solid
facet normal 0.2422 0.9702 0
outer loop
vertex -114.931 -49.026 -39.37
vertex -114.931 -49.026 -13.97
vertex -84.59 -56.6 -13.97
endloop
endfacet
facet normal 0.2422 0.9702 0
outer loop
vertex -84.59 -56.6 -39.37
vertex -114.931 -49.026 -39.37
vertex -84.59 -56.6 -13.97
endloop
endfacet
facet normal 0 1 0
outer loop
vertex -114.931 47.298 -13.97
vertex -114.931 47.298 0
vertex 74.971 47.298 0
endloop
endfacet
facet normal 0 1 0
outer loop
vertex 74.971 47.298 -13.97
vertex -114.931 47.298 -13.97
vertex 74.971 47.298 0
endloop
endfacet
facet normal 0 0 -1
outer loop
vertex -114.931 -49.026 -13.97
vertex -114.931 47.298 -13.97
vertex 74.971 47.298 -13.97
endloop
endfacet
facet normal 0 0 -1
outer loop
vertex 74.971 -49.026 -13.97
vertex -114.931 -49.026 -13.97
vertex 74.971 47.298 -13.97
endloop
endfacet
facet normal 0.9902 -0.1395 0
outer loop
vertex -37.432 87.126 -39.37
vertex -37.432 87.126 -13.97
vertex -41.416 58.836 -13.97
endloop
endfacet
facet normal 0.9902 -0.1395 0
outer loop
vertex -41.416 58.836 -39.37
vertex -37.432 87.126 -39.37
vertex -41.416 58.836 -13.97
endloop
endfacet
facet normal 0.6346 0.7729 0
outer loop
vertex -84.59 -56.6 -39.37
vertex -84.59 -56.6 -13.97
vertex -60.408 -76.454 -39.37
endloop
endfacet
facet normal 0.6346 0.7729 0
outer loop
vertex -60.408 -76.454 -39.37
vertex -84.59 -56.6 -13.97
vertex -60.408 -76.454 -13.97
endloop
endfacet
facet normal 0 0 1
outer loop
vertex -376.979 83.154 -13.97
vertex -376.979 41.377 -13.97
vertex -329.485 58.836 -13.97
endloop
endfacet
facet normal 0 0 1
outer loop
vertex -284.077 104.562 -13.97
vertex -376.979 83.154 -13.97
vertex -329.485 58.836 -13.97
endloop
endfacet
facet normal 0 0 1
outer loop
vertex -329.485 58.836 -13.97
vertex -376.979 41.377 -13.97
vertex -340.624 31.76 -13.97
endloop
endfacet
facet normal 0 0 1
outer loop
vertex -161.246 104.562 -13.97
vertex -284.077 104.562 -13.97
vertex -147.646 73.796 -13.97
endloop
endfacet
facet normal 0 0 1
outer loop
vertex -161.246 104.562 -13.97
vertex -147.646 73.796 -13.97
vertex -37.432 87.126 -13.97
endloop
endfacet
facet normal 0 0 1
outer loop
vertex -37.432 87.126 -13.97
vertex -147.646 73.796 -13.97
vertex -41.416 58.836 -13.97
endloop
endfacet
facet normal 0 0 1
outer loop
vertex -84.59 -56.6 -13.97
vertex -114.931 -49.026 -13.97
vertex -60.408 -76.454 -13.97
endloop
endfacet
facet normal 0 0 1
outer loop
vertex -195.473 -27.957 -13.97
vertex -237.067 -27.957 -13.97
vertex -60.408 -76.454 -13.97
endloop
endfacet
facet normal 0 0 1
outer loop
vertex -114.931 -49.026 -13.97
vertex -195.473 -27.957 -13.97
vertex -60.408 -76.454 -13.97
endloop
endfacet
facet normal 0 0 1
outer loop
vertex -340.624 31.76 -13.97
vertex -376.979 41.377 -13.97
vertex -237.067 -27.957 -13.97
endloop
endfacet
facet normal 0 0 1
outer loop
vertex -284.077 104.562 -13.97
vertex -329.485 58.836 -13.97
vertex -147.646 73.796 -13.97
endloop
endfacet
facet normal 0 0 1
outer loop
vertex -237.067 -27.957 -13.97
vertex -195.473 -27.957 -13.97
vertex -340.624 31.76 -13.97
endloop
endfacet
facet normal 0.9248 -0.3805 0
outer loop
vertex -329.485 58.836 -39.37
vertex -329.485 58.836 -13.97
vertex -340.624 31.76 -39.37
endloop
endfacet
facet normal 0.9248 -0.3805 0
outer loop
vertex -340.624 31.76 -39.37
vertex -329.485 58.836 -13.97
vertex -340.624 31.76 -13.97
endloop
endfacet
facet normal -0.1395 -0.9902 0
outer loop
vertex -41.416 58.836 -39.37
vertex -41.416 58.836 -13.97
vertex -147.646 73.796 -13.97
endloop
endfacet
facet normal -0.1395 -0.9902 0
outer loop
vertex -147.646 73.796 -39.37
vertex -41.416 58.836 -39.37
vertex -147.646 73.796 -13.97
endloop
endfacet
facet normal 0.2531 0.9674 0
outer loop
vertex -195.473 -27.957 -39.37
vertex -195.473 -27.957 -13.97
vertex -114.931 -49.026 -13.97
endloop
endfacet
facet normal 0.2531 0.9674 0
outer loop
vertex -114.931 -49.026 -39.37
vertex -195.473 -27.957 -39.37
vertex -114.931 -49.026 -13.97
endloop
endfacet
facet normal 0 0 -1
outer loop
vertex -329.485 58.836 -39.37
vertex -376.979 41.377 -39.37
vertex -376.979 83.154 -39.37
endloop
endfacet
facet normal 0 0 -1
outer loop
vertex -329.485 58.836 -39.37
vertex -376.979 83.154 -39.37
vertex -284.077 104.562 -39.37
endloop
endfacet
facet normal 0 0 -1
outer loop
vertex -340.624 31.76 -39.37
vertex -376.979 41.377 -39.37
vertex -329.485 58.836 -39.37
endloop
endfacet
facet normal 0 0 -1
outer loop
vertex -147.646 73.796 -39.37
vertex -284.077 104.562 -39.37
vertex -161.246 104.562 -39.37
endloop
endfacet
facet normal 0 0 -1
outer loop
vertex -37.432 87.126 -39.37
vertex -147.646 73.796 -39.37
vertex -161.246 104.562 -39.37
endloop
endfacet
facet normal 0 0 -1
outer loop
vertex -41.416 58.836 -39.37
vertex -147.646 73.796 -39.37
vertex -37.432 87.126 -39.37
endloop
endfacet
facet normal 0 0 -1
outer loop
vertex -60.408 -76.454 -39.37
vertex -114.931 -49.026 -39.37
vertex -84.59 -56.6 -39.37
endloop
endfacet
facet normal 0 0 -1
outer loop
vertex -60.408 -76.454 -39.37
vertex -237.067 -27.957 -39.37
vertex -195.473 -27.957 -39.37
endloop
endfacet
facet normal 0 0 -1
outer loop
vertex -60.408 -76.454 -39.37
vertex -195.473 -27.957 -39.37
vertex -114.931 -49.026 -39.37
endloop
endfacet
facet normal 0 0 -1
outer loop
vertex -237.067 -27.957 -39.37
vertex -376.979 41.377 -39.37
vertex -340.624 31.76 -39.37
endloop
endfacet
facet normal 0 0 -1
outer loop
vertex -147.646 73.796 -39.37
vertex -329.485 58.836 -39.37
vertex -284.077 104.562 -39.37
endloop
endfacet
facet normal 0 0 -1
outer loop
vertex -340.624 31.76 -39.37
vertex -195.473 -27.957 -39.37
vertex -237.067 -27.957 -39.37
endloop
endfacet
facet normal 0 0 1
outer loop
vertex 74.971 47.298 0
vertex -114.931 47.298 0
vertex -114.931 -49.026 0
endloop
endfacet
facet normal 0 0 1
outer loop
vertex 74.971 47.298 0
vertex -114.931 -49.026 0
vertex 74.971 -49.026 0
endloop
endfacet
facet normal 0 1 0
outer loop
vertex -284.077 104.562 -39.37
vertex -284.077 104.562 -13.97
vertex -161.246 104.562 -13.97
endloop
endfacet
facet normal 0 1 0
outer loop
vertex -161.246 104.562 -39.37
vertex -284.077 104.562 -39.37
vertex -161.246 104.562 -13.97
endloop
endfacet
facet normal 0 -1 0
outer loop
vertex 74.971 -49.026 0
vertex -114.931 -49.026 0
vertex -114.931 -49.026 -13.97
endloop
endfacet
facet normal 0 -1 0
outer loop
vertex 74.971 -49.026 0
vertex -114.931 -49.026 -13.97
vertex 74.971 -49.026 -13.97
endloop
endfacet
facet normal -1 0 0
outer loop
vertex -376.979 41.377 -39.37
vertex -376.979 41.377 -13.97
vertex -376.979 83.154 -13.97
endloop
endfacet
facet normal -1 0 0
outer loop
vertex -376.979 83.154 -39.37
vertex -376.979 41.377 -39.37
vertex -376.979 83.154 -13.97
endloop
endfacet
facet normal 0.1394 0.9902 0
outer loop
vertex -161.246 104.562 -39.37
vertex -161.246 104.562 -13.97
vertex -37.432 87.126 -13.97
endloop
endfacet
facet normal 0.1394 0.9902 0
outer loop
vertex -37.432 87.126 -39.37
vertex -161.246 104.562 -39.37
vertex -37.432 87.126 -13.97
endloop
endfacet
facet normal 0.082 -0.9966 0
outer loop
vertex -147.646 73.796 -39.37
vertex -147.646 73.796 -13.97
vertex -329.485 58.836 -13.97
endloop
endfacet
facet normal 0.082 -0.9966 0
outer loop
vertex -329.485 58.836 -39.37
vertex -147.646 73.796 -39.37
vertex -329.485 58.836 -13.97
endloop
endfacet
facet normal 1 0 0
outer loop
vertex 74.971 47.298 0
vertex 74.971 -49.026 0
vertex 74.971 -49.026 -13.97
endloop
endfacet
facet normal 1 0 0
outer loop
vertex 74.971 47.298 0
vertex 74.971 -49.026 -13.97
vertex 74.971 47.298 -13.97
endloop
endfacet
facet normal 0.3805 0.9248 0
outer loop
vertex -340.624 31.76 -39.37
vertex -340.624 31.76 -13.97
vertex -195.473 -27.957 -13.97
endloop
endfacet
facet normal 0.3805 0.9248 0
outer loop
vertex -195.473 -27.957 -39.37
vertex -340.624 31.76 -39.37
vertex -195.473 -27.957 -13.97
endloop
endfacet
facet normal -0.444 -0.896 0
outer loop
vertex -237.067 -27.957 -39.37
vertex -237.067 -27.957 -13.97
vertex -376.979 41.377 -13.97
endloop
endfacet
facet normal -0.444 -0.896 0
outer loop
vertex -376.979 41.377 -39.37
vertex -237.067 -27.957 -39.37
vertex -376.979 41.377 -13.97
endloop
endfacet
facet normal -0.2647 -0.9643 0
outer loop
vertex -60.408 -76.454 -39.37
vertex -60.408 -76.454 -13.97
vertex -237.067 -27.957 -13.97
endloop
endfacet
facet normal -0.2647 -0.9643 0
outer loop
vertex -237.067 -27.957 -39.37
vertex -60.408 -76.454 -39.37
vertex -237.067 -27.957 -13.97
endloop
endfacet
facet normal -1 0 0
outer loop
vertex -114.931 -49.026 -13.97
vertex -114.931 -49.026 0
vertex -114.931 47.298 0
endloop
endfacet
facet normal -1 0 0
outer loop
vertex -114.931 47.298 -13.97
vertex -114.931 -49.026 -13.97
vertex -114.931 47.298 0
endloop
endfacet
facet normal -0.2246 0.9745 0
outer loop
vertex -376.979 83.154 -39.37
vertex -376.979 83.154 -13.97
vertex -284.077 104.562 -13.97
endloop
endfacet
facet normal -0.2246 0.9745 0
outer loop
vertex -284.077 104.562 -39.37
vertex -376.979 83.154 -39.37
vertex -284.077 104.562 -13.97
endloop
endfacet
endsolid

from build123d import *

# Parameters (mm, degrees)
F0_W     = 189.90235
F0_H     = 96.324153
F1_DEPTH = 13.97
F3_DEPTH = 25.4


with BuildPart() as f1:
    # F0 (on Top) → F1 (new body)
    with BuildSketch(Plane.XY):
        with Locations((-19.980274, -0.863683)):
            Rectangle(F0_W, F0_H)
    extrude(amount=-F1_DEPTH)


with BuildPart() as f3:
    # F2 (on face) → F3 (new body)
    with BuildSketch(Plane(origin=(0, 0, -13.97), x_dir=(1, 0, 0), z_dir=(0, 0, -1))):
        Polygon((-195.472792, 27.956877), (-114.931449, 49.025759), (-84.589764, 56.600366), (-60.408089, 76.454453), (-237.067461, 27.956877), (-376.978874, -41.377101), (-376.978874, -83.153598), (-284.077346, -104.561727), (-161.246053, -104.561727), (-37.432229, -87.125827), (-41.416086, -58.836113), (-147.646233, -73.795818), (-329.485079, -58.836113), (-340.624392, -31.760361), align=None)
    extrude(amount=F3_DEPTH)


solid = Compound([f1.part, f3.part])
